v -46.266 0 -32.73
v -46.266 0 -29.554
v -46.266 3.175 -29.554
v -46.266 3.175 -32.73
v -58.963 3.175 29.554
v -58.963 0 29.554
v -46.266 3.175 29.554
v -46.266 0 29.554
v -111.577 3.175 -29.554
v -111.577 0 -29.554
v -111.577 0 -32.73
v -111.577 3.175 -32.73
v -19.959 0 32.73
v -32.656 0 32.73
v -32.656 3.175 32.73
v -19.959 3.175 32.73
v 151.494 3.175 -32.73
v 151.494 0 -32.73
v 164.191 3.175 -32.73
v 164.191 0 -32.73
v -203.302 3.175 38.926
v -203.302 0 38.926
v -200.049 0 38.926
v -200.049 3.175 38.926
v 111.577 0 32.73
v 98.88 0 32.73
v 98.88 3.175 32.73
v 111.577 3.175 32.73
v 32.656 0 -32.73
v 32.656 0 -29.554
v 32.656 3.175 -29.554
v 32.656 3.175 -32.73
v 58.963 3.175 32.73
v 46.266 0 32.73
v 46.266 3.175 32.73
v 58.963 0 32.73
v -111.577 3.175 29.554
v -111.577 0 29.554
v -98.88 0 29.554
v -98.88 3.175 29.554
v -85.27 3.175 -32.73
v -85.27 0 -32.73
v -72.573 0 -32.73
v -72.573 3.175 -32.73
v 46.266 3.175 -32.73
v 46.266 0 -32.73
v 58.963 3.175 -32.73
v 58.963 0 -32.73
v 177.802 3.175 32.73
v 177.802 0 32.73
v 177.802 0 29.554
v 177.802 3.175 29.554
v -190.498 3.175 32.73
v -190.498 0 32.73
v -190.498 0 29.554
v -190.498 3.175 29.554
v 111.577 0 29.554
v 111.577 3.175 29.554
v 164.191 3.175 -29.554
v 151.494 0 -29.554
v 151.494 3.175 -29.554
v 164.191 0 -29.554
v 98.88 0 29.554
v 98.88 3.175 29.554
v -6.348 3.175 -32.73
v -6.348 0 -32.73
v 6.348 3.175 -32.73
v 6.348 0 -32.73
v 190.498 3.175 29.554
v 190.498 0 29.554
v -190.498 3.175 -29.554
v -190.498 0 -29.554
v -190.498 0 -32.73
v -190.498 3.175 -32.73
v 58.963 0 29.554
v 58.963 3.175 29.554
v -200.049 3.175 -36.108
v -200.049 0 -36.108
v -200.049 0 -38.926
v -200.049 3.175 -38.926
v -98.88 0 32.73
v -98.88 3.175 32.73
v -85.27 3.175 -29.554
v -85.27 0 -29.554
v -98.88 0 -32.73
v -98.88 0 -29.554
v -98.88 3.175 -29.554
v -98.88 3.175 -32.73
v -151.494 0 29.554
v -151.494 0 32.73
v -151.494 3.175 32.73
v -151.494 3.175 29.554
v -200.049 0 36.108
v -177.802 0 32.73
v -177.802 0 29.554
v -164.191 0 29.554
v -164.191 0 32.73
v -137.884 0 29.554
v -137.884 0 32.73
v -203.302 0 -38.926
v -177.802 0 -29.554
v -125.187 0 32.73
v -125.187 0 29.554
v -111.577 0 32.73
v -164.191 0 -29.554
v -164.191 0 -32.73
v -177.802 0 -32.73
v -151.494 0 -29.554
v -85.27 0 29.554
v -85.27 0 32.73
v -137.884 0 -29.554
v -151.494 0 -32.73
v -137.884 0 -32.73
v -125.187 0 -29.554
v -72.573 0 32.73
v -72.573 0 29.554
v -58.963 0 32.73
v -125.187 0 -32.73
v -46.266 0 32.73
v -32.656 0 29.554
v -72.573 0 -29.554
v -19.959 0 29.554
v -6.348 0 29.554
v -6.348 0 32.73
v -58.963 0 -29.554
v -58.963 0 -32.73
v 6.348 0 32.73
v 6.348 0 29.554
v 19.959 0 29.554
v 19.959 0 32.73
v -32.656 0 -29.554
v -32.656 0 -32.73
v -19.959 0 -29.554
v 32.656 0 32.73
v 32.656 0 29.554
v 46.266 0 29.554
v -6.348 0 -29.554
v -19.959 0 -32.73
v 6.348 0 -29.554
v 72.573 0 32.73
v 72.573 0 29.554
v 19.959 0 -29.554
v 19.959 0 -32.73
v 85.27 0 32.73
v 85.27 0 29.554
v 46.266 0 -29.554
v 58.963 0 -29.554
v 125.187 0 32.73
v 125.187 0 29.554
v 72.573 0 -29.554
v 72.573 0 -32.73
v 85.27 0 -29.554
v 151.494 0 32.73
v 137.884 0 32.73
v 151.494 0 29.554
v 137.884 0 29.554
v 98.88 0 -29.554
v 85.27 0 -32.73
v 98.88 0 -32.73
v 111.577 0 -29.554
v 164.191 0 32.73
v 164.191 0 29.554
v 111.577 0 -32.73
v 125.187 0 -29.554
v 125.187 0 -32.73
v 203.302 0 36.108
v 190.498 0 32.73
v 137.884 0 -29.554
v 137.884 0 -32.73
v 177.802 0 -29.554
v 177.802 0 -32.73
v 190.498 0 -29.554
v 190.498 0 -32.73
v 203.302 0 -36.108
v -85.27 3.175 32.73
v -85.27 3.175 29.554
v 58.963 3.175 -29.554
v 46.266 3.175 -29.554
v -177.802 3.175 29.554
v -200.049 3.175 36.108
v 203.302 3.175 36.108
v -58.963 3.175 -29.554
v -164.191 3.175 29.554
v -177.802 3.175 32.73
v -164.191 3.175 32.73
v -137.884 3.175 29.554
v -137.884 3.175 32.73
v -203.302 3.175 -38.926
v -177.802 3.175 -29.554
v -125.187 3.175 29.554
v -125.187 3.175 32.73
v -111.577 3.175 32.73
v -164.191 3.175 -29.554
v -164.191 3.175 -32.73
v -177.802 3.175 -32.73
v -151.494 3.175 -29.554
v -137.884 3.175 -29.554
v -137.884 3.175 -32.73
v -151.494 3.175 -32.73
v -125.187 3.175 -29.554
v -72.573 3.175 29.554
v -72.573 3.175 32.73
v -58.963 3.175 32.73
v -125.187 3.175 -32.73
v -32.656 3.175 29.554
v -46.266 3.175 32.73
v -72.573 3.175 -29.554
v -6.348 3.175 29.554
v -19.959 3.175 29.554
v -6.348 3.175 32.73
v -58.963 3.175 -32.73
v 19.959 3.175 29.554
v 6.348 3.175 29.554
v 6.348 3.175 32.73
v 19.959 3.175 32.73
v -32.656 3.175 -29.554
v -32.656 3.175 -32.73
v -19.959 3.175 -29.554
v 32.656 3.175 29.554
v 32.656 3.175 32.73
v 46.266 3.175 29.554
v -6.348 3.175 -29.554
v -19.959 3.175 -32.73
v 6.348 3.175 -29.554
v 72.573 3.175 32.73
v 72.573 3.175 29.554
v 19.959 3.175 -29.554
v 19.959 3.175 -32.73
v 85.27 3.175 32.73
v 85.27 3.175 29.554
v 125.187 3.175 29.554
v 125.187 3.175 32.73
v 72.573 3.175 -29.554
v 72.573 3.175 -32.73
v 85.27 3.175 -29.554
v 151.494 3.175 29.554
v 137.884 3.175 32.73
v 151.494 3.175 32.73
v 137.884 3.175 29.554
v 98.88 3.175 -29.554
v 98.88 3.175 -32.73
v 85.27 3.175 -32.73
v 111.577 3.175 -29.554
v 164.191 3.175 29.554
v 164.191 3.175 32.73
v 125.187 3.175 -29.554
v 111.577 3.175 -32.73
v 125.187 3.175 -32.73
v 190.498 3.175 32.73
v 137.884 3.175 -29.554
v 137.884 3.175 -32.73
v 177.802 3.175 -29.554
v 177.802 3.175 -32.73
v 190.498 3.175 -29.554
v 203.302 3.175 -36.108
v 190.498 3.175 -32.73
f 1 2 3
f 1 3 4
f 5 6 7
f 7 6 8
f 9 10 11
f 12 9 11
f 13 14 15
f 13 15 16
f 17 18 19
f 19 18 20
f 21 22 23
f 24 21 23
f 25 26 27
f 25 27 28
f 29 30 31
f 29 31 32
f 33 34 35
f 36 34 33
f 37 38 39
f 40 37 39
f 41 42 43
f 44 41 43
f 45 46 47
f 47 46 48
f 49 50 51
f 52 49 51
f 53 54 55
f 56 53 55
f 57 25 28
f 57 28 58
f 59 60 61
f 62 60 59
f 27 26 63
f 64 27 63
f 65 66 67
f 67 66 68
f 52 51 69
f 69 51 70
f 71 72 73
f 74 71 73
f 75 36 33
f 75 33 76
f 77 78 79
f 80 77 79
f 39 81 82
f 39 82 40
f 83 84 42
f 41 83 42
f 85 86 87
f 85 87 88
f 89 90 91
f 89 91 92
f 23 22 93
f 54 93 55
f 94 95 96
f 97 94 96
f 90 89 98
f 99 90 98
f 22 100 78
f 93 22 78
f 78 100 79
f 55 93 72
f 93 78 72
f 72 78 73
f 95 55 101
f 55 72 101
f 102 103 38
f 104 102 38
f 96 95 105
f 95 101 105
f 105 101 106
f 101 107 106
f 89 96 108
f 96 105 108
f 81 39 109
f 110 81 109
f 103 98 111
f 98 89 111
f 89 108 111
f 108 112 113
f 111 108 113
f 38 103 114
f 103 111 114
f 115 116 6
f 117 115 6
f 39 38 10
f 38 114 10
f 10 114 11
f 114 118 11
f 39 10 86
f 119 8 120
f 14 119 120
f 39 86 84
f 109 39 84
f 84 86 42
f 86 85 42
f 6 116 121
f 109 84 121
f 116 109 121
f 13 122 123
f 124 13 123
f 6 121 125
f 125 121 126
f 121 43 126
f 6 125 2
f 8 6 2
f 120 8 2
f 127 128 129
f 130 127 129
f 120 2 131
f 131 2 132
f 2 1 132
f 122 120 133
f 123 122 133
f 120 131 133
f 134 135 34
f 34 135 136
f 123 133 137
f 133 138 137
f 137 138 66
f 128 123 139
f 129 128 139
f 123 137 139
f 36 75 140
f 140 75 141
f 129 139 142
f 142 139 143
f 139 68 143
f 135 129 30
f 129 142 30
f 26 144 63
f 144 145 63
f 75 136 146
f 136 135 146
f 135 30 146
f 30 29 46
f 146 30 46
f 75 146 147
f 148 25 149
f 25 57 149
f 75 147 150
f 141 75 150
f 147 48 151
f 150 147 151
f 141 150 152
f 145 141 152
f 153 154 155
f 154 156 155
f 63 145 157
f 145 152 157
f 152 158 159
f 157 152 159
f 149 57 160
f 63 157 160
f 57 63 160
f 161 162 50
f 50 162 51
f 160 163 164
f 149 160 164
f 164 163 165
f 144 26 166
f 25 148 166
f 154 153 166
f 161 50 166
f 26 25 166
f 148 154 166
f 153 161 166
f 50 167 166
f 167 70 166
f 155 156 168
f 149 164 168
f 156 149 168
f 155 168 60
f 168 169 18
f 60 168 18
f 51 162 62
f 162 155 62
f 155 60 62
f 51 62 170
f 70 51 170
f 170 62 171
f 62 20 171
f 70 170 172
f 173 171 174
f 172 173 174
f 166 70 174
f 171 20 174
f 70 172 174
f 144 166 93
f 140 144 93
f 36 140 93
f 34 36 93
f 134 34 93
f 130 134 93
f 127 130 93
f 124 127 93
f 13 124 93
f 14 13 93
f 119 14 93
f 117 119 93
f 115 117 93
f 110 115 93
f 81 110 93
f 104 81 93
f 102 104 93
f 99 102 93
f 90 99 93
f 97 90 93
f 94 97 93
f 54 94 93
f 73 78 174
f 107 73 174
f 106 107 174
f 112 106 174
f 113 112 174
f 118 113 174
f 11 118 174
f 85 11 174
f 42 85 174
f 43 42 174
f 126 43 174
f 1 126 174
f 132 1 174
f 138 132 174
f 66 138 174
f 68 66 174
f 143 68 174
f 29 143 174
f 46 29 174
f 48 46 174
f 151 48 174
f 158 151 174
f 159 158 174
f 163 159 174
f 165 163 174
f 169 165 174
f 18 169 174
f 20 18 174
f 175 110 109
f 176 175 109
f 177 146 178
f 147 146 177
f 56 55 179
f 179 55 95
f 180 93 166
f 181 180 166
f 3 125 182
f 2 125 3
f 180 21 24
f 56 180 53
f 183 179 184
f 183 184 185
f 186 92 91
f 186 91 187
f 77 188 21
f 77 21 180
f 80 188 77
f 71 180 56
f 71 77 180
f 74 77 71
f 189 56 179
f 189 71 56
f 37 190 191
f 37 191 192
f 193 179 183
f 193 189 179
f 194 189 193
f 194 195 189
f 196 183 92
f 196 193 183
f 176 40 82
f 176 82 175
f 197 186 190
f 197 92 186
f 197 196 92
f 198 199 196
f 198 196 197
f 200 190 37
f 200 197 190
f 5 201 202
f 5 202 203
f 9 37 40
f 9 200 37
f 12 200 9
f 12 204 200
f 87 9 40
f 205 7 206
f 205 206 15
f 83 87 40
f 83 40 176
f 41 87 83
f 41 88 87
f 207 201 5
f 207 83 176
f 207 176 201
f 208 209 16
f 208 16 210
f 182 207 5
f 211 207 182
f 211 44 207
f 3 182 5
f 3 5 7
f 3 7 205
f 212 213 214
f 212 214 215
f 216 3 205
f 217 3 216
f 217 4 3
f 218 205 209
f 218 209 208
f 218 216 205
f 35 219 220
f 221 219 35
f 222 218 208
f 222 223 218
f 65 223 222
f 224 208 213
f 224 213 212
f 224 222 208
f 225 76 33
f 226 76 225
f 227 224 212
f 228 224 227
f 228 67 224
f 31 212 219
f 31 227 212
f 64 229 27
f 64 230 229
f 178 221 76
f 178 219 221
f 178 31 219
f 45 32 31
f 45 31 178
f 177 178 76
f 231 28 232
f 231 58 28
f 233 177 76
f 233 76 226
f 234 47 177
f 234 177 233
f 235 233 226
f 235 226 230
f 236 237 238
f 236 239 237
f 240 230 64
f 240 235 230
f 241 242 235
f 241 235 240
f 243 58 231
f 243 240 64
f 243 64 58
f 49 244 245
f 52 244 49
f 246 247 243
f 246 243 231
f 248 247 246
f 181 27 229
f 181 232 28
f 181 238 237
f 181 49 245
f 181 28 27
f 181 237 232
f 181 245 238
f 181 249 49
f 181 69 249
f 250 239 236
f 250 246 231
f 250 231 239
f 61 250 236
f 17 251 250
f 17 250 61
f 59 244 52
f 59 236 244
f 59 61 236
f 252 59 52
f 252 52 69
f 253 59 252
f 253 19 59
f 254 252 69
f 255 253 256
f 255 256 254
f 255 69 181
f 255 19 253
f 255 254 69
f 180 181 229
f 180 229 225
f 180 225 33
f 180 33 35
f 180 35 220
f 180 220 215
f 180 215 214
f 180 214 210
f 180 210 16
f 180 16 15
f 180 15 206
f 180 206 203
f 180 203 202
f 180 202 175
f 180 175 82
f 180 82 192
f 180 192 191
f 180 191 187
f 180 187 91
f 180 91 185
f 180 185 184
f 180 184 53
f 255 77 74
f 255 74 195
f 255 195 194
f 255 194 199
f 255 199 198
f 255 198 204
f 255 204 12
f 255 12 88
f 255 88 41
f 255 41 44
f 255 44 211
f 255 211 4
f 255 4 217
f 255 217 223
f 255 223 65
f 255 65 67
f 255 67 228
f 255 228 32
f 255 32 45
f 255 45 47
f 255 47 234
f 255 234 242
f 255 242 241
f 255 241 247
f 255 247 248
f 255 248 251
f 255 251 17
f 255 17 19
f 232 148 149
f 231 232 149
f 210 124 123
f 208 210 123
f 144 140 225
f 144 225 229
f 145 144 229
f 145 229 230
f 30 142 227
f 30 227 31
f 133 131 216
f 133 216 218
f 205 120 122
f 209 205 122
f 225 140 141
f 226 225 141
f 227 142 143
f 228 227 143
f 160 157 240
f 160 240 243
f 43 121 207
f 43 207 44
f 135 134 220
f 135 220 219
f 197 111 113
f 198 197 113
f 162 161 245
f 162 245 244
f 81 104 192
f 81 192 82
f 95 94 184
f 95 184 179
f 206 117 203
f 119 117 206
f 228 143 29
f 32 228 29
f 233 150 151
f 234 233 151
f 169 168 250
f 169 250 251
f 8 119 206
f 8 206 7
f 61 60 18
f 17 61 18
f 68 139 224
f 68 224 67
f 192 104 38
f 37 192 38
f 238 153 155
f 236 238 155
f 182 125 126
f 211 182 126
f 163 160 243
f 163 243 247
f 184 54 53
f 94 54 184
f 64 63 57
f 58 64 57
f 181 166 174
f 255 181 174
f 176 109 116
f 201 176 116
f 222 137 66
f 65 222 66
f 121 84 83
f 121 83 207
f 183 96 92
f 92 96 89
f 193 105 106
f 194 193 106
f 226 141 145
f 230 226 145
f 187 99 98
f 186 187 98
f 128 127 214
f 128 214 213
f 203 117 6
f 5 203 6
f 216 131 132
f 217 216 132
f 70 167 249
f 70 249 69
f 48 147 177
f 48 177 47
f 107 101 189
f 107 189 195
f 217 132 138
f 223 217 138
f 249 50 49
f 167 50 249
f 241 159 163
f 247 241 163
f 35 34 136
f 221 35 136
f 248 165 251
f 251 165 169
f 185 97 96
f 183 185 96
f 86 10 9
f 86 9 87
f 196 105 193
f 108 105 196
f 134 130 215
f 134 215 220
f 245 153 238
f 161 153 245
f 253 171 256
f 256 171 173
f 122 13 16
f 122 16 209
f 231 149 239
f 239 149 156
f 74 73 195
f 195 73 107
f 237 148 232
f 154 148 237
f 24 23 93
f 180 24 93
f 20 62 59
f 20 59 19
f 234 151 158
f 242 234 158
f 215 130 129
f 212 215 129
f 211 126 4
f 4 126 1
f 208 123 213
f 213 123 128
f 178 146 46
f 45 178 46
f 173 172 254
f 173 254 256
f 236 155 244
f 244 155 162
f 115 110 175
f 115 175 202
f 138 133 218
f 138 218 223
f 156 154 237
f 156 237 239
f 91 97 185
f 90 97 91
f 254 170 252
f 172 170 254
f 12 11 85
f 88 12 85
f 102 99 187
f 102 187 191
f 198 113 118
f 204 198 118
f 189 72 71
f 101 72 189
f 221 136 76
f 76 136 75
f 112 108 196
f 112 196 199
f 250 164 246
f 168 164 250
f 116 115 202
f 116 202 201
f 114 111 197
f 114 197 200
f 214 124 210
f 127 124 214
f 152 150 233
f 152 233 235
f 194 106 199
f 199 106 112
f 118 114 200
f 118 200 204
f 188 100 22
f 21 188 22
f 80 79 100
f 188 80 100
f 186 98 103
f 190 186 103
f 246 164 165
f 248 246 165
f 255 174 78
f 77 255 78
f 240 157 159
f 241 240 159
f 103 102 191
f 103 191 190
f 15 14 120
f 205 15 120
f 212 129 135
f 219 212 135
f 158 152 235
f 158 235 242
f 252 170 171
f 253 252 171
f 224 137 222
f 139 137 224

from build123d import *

# Parameters (mm, degrees)
SKETCH1_W           = 12.6968
SKETCH1_H           = 3.175
BOSS_EXTRUDE1_DEPTH = 3.175


with BuildPart() as part:
    # Sketch1 → Boss-Extrude1 (new body)
    with BuildSketch(Plane(origin=(0, 0, 0), x_dir=(1, 0, 0), z_dir=(0, 1, 0))):
        Polygon((-200.0487998, -36.1077), (203.3016, -36.1077), (203.3016, 36.1077), (-200.0487998, 36.1077), (-200.0487998, 38.9255), (-203.3016, 38.9255), (-203.3016, -38.9255), (-200.0487998, -38.9255), align=None)
        with Locations((-157.842857143, -31.142)):
            Rectangle(SKETCH1_W, SKETCH1_H, mode=Mode.SUBTRACT)
        with Locations((184.15, -31.142)):
            Rectangle(SKETCH1_W, SKETCH1_H, mode=Mode.SUBTRACT)
        with Locations((-131.535714286, -31.142)):
            Rectangle(SKETCH1_W, SKETCH1_H, mode=Mode.SUBTRACT)
        with Locations((-105.228571429, -31.142)):
            Rectangle(SKETCH1_W, SKETCH1_H, mode=Mode.SUBTRACT)
        with Locations((157.842857143, -31.142)):
            Rectangle(SKETCH1_W, SKETCH1_H, mode=Mode.SUBTRACT)
        with Locations((131.535714286, -31.142)):
            Rectangle(SKETCH1_W, SKETCH1_H, mode=Mode.SUBTRACT)
        with Locations((105.228571429, -31.142)):
            Rectangle(SKETCH1_W, SKETCH1_H, mode=Mode.SUBTRACT)
        with Locations((78.921428571, -31.142)):
            Rectangle(SKETCH1_W, SKETCH1_H, mode=Mode.SUBTRACT)
        with Locations((52.614285714, -31.142)):
            Rectangle(SKETCH1_W, SKETCH1_H, mode=Mode.SUBTRACT)
        with Locations((26.307142857, -31.142)):
            Rectangle(SKETCH1_W, SKETCH1_H, mode=Mode.SUBTRACT)
        with Locations((0, -31.142)):
            Rectangle(SKETCH1_W, SKETCH1_H, mode=Mode.SUBTRACT)
        with Locations((-26.307142857, -31.142)):
            Rectangle(SKETCH1_W, SKETCH1_H, mode=Mode.SUBTRACT)
        with Locations((-52.614285714, -31.142)):
            Rectangle(SKETCH1_W, SKETCH1_H, mode=Mode.SUBTRACT)
        with Locations((-78.921428571, -31.142)):
            Rectangle(SKETCH1_W, SKETCH1_H, mode=Mode.SUBTRACT)
        with Locations((-184.15, -31.142)):
            Rectangle(SKETCH1_W, SKETCH1_H, mode=Mode.SUBTRACT)
        with Locations((184.15, 31.142)):
            Rectangle(SKETCH1_W, SKETCH1_H, mode=Mode.SUBTRACT)
        with Locations((-157.842857143, 31.142)):
            Rectangle(SKETCH1_W, SKETCH1_H, mode=Mode.SUBTRACT)
        with Locations((-131.535714286, 31.142)):
            Rectangle(SKETCH1_W, SKETCH1_H, mode=Mode.SUBTRACT)
        with Locations((-105.228571429, 31.142)):
            Rectangle(SKETCH1_W, SKETCH1_H, mode=Mode.SUBTRACT)
        with Locations((-78.921428571, 31.142)):
            Rectangle(SKETCH1_W, SKETCH1_H, mode=Mode.SUBTRACT)
        with Locations((-52.614285714, 31.142)):
            Rectangle(SKETCH1_W, SKETCH1_H, mode=Mode.SUBTRACT)
        with Locations((-26.307142857, 31.142)):
            Rectangle(SKETCH1_W, SKETCH1_H, mode=Mode.SUBTRACT)
        with Locations((0, 31.142)):
            Rectangle(SKETCH1_W, SKETCH1_H, mode=Mode.SUBTRACT)
        with Locations((26.307142857, 31.142)):
            Rectangle(SKETCH1_W, SKETCH1_H, mode=Mode.SUBTRACT)
        with Locations((52.614285714, 31.142)):
            Rectangle(SKETCH1_W, SKETCH1_H, mode=Mode.SUBTRACT)
        with Locations((78.921428571, 31.142)):
            Rectangle(SKETCH1_W, SKETCH1_H, mode=Mode.SUBTRACT)
        with Locations((105.228571429, 31.142)):
            Rectangle(SKETCH1_W, SKETCH1_H, mode=Mode.SUBTRACT)
        with Locations((131.535714286, 31.142)):
            Rectangle(SKETCH1_W, SKETCH1_H, mode=Mode.SUBTRACT)
        with Locations((157.842857143, 31.142)):
            Rectangle(SKETCH1_W, SKETCH1_H, mode=Mode.SUBTRACT)
        with Locations((-184.15, 31.142)):
            Rectangle(SKETCH1_W, SKETCH1_H, mode=Mode.SUBTRACT)
    extrude(amount=BOSS_EXTRUDE1_DEPTH)


solid = part.part
